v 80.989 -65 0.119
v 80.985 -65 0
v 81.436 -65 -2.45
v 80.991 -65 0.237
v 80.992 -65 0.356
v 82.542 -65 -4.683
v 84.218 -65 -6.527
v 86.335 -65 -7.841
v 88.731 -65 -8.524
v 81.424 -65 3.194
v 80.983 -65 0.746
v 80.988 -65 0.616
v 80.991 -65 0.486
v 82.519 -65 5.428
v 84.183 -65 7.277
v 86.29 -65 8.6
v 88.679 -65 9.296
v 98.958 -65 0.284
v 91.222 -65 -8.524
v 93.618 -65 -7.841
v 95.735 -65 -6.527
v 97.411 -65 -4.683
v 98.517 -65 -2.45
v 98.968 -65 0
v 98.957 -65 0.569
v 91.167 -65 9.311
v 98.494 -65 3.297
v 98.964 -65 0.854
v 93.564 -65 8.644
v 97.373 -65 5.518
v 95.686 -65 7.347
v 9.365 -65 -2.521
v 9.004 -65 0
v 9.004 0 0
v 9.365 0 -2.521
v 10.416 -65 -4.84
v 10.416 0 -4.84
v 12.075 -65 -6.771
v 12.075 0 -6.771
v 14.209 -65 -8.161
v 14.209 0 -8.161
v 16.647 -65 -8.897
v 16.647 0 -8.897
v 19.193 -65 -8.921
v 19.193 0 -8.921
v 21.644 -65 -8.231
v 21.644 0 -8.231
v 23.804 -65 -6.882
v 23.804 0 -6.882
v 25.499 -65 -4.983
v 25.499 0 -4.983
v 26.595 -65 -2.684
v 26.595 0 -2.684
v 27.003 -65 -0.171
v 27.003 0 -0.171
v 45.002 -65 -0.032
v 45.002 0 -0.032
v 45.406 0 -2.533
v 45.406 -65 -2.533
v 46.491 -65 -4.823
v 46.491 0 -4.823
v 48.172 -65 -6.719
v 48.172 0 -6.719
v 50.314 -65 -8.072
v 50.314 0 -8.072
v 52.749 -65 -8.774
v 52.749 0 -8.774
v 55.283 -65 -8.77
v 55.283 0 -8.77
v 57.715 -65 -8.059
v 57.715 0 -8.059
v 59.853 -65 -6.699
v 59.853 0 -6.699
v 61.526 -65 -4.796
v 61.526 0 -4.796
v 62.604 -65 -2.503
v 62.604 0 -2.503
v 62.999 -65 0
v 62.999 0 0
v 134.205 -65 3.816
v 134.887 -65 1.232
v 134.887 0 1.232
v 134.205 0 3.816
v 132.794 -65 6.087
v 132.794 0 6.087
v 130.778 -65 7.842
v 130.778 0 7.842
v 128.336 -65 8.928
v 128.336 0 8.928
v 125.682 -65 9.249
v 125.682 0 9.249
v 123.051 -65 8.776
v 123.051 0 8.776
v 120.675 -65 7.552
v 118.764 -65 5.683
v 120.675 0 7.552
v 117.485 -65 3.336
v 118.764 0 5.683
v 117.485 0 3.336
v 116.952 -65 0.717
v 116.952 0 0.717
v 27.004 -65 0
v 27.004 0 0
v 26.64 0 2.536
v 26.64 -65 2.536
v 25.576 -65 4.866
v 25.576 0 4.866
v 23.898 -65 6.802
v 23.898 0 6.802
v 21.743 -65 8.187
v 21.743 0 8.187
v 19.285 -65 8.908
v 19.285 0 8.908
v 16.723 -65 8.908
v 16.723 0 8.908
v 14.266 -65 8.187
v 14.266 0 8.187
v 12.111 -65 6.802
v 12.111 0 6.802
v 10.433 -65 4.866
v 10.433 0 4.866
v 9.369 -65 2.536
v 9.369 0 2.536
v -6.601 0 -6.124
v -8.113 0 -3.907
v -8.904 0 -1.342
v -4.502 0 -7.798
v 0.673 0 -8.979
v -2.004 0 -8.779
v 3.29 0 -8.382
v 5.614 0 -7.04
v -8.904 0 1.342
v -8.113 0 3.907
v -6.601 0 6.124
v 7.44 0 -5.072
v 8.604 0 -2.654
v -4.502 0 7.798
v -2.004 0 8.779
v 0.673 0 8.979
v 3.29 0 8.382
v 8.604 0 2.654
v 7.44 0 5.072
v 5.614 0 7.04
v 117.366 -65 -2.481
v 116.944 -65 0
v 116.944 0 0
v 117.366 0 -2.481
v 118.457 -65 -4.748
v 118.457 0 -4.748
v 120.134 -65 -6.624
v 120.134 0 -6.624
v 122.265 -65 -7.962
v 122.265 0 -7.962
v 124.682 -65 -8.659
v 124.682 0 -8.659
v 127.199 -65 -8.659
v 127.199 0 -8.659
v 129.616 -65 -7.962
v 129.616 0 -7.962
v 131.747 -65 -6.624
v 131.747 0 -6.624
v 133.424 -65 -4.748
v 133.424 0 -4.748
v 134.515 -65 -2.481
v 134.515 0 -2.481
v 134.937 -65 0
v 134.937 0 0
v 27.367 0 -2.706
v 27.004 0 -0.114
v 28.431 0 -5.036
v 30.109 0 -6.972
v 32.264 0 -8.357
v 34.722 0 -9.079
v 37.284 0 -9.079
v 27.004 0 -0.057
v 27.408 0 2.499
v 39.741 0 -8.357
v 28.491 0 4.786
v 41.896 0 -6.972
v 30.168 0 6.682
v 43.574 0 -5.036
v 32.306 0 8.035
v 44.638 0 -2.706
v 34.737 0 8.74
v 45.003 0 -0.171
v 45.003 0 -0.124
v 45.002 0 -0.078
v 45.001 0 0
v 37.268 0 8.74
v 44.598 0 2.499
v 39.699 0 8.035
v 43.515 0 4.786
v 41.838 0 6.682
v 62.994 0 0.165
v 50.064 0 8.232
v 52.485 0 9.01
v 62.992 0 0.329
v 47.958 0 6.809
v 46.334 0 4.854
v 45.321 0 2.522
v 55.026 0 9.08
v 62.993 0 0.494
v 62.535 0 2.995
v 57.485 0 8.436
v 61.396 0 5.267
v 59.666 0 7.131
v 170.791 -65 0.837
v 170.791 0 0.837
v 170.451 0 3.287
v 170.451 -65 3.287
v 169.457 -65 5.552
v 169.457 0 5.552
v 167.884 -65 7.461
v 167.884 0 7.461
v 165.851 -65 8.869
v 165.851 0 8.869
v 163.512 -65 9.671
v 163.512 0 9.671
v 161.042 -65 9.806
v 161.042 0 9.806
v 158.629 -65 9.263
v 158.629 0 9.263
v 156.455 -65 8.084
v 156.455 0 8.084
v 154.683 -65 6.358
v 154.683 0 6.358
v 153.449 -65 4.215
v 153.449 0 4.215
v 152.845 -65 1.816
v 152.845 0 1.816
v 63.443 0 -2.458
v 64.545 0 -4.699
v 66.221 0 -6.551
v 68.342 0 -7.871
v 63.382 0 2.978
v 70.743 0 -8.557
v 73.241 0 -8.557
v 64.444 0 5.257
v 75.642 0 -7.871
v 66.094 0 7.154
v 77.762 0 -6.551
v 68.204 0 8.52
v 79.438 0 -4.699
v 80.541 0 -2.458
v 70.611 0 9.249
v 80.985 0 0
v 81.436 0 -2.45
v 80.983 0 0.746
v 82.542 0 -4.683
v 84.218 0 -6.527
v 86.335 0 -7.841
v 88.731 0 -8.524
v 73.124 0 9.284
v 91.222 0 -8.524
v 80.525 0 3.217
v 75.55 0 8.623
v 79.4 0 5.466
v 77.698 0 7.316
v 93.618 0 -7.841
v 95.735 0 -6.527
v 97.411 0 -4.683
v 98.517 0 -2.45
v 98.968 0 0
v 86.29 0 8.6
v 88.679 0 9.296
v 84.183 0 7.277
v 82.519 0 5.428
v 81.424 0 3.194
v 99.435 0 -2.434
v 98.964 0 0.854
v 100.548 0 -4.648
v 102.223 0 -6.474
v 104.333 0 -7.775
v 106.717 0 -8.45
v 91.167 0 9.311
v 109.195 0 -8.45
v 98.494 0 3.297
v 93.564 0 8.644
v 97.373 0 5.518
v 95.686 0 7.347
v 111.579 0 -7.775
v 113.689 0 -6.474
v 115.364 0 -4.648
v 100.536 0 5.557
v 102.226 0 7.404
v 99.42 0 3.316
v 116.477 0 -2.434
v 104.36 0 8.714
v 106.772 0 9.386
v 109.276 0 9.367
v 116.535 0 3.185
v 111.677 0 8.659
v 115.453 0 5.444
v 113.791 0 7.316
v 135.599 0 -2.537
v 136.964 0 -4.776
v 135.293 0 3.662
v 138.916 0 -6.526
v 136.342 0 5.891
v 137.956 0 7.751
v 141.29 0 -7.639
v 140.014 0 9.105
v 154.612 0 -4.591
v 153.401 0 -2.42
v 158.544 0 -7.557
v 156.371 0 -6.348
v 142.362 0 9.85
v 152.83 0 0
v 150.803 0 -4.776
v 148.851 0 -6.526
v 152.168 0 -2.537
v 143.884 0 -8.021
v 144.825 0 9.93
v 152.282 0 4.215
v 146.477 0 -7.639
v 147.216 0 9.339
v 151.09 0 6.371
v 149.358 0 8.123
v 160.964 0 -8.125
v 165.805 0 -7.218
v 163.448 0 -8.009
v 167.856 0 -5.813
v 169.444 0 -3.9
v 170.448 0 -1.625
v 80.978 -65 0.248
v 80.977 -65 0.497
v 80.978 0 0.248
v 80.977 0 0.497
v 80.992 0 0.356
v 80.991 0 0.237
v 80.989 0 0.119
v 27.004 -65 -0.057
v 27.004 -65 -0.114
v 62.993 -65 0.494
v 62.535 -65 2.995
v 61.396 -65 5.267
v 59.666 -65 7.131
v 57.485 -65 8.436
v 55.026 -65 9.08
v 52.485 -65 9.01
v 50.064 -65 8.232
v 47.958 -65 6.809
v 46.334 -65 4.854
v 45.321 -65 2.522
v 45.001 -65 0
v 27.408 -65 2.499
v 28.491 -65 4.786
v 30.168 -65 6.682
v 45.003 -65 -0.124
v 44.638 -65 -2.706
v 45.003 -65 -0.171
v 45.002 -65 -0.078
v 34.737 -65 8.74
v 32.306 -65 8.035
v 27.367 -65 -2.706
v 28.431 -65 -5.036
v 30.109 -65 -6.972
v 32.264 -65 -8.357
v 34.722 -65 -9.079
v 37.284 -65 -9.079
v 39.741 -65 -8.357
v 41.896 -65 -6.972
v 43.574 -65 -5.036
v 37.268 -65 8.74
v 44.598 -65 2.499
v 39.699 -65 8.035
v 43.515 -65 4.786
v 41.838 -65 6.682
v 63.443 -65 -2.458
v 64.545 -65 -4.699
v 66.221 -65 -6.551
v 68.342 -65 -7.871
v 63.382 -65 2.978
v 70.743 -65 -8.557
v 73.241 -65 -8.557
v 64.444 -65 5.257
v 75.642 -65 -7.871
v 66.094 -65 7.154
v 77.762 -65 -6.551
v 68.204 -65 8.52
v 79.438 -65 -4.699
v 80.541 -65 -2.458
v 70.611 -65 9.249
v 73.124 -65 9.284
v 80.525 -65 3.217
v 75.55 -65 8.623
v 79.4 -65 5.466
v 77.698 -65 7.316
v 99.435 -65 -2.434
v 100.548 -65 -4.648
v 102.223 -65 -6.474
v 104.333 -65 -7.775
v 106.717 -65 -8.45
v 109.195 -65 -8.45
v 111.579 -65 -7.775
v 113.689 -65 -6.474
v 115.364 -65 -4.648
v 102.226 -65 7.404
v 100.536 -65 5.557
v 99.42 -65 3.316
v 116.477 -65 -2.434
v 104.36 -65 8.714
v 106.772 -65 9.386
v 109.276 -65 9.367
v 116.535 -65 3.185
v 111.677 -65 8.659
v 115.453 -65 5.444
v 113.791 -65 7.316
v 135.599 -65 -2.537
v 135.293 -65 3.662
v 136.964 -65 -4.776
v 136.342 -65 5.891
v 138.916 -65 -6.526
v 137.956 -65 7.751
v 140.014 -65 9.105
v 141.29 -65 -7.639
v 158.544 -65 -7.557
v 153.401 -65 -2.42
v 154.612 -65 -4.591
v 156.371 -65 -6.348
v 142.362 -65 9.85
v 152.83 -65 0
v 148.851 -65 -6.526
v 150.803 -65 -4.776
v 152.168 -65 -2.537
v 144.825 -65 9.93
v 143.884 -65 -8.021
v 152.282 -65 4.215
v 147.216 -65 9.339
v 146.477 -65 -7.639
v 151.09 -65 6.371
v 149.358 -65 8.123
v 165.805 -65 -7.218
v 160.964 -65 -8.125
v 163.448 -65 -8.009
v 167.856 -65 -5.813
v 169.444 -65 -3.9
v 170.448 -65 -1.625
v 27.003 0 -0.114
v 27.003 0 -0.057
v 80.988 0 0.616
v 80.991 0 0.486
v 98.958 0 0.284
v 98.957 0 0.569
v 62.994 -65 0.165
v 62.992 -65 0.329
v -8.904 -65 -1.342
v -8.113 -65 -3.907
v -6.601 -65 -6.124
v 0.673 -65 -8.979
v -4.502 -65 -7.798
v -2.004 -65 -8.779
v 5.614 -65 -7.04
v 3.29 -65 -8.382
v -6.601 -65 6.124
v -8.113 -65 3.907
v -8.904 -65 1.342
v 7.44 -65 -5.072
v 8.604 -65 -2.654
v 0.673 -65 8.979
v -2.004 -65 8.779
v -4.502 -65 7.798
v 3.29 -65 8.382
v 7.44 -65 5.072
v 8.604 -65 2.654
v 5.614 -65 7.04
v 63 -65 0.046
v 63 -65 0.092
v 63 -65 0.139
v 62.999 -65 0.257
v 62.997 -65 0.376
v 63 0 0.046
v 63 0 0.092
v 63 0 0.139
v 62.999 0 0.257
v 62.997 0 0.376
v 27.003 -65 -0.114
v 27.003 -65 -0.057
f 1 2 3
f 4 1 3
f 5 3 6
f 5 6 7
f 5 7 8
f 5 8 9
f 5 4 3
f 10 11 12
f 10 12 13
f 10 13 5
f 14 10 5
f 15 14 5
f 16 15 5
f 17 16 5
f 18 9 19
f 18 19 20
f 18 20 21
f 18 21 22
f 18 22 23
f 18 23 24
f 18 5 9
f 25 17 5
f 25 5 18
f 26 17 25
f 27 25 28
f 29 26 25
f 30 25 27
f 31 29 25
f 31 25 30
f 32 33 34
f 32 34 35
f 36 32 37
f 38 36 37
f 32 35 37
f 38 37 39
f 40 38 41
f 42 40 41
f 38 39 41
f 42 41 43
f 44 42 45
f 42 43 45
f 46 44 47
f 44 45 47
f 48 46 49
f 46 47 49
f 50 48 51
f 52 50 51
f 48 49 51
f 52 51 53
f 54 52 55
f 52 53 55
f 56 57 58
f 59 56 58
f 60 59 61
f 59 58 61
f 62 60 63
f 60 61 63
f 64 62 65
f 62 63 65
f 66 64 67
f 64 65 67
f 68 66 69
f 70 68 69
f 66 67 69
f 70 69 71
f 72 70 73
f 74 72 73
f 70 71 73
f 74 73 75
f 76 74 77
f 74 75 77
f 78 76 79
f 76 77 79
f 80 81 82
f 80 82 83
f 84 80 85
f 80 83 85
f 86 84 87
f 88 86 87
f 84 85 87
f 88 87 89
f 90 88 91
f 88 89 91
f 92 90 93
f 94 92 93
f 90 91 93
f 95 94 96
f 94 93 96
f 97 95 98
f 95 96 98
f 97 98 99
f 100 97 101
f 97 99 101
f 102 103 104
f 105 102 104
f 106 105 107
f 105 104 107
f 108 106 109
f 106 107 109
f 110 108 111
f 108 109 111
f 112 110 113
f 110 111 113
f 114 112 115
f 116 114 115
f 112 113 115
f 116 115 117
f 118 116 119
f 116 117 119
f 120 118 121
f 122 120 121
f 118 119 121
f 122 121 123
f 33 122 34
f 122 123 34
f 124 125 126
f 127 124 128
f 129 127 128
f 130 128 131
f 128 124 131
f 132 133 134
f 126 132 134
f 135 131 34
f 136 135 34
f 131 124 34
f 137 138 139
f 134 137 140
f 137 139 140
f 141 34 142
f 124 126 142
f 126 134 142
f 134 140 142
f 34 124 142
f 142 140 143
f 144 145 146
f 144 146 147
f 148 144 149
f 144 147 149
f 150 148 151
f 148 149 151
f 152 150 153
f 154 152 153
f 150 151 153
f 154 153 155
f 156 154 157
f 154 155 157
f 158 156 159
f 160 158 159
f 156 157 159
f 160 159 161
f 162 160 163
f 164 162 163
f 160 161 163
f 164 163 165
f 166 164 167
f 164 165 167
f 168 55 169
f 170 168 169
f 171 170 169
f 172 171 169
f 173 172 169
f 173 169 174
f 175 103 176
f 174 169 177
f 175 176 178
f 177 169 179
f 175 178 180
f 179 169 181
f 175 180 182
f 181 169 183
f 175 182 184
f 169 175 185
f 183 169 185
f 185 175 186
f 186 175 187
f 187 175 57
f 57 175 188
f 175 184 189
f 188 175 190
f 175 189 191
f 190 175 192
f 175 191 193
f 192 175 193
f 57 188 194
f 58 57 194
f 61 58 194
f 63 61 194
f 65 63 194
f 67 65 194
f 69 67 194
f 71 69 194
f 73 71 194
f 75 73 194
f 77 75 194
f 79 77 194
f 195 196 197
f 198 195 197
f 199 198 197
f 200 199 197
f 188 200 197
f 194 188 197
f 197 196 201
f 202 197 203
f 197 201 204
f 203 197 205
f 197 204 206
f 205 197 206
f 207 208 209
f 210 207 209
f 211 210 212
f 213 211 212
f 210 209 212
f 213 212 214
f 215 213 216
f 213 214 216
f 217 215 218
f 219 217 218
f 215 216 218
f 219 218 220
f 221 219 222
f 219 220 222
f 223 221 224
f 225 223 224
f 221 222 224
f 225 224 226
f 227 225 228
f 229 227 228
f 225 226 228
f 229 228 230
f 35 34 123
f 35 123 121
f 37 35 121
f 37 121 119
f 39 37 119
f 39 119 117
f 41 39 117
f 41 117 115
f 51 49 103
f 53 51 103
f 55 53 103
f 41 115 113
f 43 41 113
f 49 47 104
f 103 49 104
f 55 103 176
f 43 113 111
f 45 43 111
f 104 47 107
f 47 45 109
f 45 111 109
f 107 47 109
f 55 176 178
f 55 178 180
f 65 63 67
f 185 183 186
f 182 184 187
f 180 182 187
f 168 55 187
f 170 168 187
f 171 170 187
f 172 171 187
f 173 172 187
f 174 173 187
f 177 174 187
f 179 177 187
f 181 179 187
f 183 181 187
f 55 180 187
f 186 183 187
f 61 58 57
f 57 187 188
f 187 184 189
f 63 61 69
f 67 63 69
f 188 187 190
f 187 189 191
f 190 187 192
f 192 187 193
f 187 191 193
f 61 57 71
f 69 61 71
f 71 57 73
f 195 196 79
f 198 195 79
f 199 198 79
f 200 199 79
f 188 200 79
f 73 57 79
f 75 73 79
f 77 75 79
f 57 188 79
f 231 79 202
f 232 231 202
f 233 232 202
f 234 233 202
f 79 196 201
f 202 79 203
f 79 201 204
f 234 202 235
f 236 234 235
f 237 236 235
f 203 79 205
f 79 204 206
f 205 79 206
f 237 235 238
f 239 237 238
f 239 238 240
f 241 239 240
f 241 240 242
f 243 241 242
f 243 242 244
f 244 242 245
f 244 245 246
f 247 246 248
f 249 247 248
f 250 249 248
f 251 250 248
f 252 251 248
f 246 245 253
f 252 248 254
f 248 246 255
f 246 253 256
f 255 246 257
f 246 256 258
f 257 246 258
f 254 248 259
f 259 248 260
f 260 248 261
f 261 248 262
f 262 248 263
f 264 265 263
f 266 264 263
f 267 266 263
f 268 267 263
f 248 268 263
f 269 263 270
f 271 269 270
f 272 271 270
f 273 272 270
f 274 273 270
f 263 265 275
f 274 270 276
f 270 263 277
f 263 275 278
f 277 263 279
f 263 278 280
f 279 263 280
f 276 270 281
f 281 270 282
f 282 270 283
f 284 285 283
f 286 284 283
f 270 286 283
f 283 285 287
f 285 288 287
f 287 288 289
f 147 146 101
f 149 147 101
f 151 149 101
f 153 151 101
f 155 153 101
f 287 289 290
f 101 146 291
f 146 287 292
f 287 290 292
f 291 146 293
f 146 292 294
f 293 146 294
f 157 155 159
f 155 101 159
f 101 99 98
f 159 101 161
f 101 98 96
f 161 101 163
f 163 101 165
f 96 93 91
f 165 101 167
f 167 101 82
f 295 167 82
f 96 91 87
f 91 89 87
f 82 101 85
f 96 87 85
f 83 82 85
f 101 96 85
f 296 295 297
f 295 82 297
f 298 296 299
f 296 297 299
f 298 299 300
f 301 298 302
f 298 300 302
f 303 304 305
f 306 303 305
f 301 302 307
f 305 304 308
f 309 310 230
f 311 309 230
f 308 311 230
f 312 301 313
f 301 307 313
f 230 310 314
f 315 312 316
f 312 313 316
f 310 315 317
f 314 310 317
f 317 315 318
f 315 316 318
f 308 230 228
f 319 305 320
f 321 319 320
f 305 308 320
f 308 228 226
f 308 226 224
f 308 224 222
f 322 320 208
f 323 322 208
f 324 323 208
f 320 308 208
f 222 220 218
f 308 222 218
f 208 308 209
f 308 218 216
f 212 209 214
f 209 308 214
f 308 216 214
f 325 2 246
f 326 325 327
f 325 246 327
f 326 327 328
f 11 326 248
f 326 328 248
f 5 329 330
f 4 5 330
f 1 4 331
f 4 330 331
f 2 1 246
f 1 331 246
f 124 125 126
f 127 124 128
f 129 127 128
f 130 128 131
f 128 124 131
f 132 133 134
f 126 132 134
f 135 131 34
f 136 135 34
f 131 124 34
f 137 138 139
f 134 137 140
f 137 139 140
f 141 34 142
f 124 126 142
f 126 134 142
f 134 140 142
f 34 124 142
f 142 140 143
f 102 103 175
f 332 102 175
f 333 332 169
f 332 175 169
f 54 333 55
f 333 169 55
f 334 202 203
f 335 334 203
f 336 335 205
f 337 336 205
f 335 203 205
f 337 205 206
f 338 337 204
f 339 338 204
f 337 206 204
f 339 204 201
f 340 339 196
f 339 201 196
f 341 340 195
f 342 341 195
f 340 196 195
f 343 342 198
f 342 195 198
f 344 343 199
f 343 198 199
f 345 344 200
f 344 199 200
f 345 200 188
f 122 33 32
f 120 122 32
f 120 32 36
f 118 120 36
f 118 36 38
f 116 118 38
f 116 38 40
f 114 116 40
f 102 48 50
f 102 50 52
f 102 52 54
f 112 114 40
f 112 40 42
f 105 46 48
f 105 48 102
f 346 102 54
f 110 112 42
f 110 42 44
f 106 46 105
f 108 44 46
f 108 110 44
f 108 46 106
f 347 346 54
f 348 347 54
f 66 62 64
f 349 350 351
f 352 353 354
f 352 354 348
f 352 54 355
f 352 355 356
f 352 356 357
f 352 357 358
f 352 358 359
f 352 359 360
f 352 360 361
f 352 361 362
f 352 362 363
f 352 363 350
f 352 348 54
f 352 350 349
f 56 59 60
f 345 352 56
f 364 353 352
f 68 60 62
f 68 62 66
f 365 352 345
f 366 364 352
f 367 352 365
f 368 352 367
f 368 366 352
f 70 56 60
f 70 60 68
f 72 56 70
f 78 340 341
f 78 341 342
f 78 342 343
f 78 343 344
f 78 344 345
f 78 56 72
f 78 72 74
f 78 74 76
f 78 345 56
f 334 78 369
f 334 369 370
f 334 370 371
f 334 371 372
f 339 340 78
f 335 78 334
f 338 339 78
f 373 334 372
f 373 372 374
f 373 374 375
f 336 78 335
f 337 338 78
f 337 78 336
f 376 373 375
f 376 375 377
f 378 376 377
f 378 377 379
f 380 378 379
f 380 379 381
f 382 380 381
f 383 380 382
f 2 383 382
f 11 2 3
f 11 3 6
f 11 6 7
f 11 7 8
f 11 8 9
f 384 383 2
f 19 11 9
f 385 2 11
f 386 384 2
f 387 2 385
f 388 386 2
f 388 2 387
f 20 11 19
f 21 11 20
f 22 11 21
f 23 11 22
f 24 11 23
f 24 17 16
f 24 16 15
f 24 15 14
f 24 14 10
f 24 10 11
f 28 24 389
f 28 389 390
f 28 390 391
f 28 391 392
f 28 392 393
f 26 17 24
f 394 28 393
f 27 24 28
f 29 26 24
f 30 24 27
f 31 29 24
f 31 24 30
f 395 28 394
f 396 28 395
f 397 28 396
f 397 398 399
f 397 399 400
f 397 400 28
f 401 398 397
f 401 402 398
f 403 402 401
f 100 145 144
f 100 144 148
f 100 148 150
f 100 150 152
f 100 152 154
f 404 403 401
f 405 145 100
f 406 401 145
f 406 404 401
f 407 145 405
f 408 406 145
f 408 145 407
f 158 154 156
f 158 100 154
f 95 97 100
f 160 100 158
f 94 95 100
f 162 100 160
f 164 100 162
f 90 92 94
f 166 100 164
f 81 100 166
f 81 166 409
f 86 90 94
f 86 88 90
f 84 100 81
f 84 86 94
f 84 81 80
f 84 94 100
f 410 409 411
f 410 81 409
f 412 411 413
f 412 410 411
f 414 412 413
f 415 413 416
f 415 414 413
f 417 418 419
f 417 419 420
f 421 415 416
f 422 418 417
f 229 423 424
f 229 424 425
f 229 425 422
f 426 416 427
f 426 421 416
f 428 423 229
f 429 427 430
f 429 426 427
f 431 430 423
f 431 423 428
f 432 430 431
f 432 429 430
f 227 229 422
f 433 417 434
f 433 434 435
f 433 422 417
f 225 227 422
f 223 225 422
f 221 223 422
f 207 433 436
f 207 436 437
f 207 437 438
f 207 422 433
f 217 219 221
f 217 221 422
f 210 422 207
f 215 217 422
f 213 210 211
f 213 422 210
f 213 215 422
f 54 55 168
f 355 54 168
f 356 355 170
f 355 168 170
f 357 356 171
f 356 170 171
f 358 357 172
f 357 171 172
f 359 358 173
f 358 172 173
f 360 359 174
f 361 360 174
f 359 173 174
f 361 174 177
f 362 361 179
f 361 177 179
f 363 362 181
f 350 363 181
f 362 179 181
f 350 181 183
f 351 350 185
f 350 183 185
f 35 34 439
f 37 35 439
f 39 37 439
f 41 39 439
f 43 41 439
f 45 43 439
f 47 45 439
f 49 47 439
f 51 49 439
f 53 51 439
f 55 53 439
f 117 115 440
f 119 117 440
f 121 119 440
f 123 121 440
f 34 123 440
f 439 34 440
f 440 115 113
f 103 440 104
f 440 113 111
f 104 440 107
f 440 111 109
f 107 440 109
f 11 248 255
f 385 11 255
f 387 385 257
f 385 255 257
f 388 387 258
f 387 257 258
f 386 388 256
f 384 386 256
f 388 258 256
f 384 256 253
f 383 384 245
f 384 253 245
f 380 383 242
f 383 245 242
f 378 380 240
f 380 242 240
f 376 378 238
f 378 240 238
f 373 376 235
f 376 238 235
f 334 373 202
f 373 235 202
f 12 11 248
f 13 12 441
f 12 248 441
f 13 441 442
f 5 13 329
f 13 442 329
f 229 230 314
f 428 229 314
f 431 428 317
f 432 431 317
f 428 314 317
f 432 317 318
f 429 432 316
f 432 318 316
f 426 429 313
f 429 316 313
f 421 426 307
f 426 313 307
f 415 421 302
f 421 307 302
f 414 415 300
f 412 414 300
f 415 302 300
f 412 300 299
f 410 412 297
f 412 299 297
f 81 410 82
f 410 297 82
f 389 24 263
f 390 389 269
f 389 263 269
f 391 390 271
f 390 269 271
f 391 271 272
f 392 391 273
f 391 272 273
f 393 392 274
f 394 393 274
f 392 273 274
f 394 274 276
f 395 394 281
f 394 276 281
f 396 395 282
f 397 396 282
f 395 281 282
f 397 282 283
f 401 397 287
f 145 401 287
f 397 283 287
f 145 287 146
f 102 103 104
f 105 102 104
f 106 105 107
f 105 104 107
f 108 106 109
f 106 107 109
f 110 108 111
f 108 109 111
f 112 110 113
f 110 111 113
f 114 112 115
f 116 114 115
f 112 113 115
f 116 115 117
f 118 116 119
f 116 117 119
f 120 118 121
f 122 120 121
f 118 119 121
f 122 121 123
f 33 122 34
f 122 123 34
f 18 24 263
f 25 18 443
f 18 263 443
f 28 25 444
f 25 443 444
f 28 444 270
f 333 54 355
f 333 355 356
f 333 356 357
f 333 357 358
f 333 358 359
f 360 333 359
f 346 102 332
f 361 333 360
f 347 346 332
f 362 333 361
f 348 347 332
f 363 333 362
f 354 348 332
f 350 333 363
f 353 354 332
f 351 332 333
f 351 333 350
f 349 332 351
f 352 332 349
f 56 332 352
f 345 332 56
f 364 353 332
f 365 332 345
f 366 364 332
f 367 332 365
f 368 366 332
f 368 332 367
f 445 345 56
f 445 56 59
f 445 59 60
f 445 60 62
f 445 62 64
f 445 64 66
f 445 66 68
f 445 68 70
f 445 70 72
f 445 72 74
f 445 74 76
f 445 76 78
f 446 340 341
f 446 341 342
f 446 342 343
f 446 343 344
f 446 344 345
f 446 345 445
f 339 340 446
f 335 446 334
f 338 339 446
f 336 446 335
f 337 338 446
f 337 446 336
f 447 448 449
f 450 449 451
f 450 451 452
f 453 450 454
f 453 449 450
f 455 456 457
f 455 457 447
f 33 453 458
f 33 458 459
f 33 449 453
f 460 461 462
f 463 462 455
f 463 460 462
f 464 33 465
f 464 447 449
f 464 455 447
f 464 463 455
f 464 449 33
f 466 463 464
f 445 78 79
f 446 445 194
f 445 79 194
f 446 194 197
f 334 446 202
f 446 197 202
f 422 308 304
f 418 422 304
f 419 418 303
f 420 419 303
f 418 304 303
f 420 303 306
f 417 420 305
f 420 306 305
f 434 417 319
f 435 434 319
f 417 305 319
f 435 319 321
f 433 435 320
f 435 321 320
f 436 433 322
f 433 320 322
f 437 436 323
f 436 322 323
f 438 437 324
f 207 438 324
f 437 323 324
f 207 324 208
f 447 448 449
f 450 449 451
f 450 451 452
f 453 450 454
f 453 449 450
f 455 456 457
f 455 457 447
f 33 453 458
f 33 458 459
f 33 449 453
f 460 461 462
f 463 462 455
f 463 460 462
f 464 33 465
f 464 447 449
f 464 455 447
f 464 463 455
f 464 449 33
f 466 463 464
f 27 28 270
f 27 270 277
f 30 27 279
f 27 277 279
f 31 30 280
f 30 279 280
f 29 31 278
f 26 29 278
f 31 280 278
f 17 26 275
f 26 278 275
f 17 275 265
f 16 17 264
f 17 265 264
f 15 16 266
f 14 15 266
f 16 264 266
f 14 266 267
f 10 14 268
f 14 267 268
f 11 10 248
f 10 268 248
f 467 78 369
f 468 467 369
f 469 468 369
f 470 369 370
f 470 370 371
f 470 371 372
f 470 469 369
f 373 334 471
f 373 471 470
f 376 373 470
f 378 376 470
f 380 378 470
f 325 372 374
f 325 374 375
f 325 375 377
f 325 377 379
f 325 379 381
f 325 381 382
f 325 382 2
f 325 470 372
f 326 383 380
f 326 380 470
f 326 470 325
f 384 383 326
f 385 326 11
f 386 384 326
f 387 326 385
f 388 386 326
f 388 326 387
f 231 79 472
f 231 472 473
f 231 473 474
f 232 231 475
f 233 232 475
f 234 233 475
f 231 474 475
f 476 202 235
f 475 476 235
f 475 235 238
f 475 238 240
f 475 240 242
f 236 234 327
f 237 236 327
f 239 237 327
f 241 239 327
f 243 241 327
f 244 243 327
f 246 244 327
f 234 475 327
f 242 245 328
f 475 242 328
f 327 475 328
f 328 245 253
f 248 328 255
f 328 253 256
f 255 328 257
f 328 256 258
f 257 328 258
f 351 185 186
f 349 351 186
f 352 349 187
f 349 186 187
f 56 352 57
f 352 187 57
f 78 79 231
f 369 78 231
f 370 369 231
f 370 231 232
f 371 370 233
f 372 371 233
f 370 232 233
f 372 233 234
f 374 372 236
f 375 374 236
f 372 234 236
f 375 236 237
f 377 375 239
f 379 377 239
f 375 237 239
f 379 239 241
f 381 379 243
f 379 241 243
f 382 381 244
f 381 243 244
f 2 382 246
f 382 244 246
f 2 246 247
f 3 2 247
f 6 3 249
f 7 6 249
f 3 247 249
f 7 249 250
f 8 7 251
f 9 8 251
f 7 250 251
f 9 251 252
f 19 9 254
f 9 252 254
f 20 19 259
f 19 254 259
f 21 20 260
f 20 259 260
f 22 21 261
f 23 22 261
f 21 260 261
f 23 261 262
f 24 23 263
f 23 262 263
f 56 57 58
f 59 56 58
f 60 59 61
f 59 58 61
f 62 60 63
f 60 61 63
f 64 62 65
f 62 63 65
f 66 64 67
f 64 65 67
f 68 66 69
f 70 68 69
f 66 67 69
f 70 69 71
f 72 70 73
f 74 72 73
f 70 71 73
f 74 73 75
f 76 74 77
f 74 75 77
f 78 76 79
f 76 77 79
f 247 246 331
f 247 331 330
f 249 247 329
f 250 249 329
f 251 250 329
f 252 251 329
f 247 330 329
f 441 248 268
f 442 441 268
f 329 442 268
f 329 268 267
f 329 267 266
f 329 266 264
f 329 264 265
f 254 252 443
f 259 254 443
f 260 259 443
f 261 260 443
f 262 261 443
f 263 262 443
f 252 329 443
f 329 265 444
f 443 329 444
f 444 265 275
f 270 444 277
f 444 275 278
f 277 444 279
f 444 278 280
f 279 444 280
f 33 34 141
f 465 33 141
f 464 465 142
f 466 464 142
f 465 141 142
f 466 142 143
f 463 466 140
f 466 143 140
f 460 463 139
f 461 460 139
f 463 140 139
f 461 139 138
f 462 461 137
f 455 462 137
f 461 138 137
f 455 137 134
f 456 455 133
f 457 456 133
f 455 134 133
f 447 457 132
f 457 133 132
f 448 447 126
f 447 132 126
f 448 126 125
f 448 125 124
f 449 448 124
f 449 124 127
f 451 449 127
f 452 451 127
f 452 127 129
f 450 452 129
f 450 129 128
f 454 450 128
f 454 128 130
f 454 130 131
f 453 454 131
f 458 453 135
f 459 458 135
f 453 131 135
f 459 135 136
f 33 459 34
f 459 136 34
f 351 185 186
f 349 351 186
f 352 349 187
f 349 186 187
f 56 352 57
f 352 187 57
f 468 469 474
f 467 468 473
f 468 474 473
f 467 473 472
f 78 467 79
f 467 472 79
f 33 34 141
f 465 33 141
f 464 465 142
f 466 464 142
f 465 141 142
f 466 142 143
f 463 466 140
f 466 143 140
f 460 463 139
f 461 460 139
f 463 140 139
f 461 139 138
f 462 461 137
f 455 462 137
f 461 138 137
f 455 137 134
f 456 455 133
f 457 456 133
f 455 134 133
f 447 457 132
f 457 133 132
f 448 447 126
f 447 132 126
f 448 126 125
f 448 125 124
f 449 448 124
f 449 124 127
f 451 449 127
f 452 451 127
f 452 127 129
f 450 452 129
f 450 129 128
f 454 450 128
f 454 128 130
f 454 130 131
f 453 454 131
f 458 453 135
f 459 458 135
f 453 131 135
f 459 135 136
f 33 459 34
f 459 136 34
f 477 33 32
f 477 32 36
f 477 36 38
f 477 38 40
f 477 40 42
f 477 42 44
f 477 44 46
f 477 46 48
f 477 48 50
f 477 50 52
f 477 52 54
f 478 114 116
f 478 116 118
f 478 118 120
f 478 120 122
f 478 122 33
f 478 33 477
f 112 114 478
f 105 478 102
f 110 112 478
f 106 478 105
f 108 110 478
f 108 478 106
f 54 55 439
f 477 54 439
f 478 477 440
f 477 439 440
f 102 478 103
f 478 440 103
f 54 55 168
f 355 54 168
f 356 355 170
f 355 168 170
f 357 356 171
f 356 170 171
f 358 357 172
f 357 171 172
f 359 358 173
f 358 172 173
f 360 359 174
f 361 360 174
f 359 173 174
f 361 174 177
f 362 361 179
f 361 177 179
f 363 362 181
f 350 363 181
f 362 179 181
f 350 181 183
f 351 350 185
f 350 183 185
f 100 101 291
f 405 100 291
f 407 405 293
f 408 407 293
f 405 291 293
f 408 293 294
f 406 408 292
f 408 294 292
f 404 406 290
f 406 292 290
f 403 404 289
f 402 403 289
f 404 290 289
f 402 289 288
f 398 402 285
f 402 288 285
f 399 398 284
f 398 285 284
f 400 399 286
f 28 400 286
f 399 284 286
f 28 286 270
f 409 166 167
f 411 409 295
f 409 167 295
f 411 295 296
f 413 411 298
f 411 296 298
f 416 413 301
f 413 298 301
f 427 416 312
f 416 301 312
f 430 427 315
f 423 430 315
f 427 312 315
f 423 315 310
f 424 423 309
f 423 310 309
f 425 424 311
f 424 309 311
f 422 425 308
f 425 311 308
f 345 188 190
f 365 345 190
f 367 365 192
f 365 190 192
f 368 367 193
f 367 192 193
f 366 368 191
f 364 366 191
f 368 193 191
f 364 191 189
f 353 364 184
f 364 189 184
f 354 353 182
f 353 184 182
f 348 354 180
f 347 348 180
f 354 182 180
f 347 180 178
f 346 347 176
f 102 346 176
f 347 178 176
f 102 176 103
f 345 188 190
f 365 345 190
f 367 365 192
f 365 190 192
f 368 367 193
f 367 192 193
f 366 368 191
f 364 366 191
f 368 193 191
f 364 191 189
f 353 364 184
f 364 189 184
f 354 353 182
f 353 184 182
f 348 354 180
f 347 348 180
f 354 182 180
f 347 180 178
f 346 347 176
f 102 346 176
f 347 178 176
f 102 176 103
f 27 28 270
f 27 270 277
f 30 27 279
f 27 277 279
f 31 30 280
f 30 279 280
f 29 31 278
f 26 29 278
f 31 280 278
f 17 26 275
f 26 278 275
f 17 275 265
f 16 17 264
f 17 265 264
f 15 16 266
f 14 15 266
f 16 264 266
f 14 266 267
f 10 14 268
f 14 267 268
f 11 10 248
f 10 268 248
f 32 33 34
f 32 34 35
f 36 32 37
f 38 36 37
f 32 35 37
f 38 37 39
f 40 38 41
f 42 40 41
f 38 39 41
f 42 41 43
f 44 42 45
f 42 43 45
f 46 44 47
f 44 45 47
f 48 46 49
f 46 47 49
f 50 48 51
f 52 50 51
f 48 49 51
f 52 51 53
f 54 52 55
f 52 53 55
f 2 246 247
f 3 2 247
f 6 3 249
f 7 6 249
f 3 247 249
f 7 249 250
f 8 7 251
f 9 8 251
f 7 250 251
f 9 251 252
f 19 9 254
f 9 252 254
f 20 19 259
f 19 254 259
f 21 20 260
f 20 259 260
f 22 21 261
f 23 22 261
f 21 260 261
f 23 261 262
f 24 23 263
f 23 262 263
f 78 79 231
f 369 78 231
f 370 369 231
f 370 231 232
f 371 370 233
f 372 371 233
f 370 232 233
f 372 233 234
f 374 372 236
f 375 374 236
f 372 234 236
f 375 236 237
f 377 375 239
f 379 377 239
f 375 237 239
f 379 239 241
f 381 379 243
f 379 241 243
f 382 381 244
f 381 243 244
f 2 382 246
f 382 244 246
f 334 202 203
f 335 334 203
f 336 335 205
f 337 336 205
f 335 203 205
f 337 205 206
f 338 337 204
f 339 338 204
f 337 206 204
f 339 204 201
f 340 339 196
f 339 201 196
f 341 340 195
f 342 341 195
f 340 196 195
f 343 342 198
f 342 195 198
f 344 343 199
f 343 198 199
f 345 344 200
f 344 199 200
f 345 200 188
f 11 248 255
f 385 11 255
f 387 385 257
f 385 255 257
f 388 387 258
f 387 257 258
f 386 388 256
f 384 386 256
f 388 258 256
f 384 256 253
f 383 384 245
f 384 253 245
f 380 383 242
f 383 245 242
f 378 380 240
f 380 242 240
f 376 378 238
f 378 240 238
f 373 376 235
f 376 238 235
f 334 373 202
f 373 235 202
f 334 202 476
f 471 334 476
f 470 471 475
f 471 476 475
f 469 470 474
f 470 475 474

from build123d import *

# Parameters (mm, degrees)
F0_R     = 9.0043
F1_DEPTH = 65
F2_DEPTH = 65


with BuildPart() as f1:
    # F0 (on Front) → F1 (new body)
    with BuildSketch(Plane.XZ):
        Circle(F0_R)
    extrude(amount=F1_DEPTH)


with BuildPart() as f1b:
    # F0 (on Front) → F1, piece 2 (new body)
    with BuildSketch(Plane.XZ):
        with BuildLine():
            ThreePointArc((27.0043, 0), (18.0043, 9), (9.0043, 0))
            ThreePointArc((9.0043, 0), (17.9190098256, -8.9995958568), (27.0026834636, -0.1705726889))
            ThreePointArc((27.0026834636, -0.1705726889), (27.0030876068, -0.0852825145), (27.0043, 0))
        make_face()
    extrude(amount=F1_DEPTH)


with BuildPart() as f1c:
    # F0 (on Front) → F1, piece 3 (new body)
    with BuildSketch(Plane.XZ):
        with BuildLine():
            ThreePointArc((45.0013565478, -0.0160323255), (36.0107009342, 8.82942374), (27.0043, 0))
            ThreePointArc((27.0043, 0), (27.0038958568, -0.0852901744), (27.0026834636, -0.1705726889))
            ThreePointArc((27.0026834636, -0.1705726889), (36.0026834636, -9.1705726889), (45.0026834636, -0.1705726889))
            ThreePointArc((45.0026834636, -0.1705726889), (45.0023517285, -0.0932996589), (45.0013565478, -0.0160323255))
        make_face()
        with BuildLine():
            ThreePointArc((62.9929668109, 0.4942702989), (53.7448335524, 9.1348895724), (45.0013279832, -0.016032816))
            ThreePointArc((45.0013279832, -0.016032816), (54.008018538, -8.8614888815), (62.9989352075, 0))
            ThreePointArc((62.9989352075, 0), (62.9925570229, 0.2470941665), (62.9929668109, 0.4942702989))
        make_face()
    extrude(amount=F1_DEPTH)


with BuildPart() as f1d:
    # F0 (on Front) → F1, piece 4 (new body)
    with BuildSketch(Plane.XZ):
        with BuildLine():
            ThreePointArc((80.9834577198, 0.745515077), (71.8662244177, 9.3548852314), (62.9929668109, 0.4942702989))
            ThreePointArc((62.9929668109, 0.4942702989), (62.9982423314, 0.3164236907), (63.0000010674, 0.1385075474))
            ThreePointArc((63.0000010674, 0.1385075474), (62.9997345985, 0.0692517232), (62.9989352075, 0))
            ThreePointArc((62.9989352075, 0), (71.9919009511, -8.6442372485), (80.9848666946, 0))
            ThreePointArc((80.9848666946, 0), (80.9764395366, 0.3727429432), (80.9834577198, 0.745515077))
        make_face()
    extrude(amount=F1_DEPTH)


with BuildPart() as f1e:
    # F0 (on Front) → F1, piece 5 (new body)
    with BuildSketch(Plane.XZ):
        with BuildLine():
            ThreePointArc((98.9644590085, 0.8536672309), (89.9222912288, 9.3895895297), (80.9834577198, 0.745515077))
            ThreePointArc((80.9834577198, 0.745515077), (80.9897898957, 0.5506846354), (80.9919009511, 0.3557627515))
            ThreePointArc((80.9919009511, 0.3557627515), (80.9901422151, 0.1778466082), (80.9848666946, 0))
            ThreePointArc((80.9848666946, 0), (89.9764234633, -8.6102476745), (98.967980232, 0))
            ThreePointArc((98.967980232, 0), (98.9560923398, 0.4267918422), (98.9644590085, 0.8536672309))
        make_face()
    extrude(amount=F1_DEPTH)


with BuildPart() as f2:
    # F0 (on Front) → F2 (new body)
    with BuildSketch(Plane.XZ):
        Circle(F0_R)
    extrude(amount=F2_DEPTH)


with BuildPart() as f2b:
    # F0 (on Front) → F2, piece 2 (new body)
    with BuildSketch(Plane.XZ):
        with BuildLine():
            ThreePointArc((62.9929668109, 0.4942702989), (53.7448335524, 9.1348895724), (45.0013279832, -0.016032816))
            ThreePointArc((45.0013279832, -0.016032816), (54.008018538, -8.8614888815), (62.9989352075, 0))
            ThreePointArc((62.9989352075, 0), (62.9925570229, 0.2470941665), (62.9929668109, 0.4942702989))
        make_face()
        with BuildLine():
            ThreePointArc((27.0043, 0), (18.0043, 9), (9.0043, 0))
            ThreePointArc((9.0043, 0), (17.9190098256, -8.9995958568), (27.0026834636, -0.1705726889))
            ThreePointArc((27.0026834636, -0.1705726889), (27.0030876068, -0.0852825145), (27.0043, 0))
        make_face()
        with BuildLine():
            ThreePointArc((45.0013565478, -0.0160323255), (36.0107009342, 8.82942374), (27.0043, 0))
            ThreePointArc((27.0043, 0), (27.0038958568, -0.0852901744), (27.0026834636, -0.1705726889))
            ThreePointArc((27.0026834636, -0.1705726889), (36.0026834636, -9.1705726889), (45.0026834636, -0.1705726889))
            ThreePointArc((45.0026834636, -0.1705726889), (45.0023517285, -0.0932996589), (45.0013565478, -0.0160323255))
        make_face()
        with BuildLine():
            ThreePointArc((27.0026834636, -0.1705726889), (27.0038958568, -0.0852901744), (27.0043, 0))
            ThreePointArc((27.0043, 0), (27.0030876068, -0.0852825145), (27.0026834636, -0.1705726889))
        make_face()
        with BuildLine():
            ThreePointArc((80.9834577198, 0.745515077), (71.8662244177, 9.3548852314), (62.9929668109, 0.4942702989))
            ThreePointArc((62.9929668109, 0.4942702989), (62.9982423314, 0.3164236907), (63.0000010674, 0.1385075474))
            ThreePointArc((63.0000010674, 0.1385075474), (62.9997345985, 0.0692517232), (62.9989352075, 0))
            ThreePointArc((62.9989352075, 0), (71.9919009511, -8.6442372485), (80.9848666946, 0))
            ThreePointArc((80.9848666946, 0), (80.9764395366, 0.3727429432), (80.9834577198, 0.745515077))
        make_face()
        with BuildLine():
            ThreePointArc((63.0000010674, 0.1385075474), (62.9982423314, 0.3164236907), (62.9929668109, 0.4942702989))
            ThreePointArc((62.9929668109, 0.4942702989), (62.9925570229, 0.2470941665), (62.9989352075, 0))
            ThreePointArc((62.9989352075, 0), (62.9997345985, 0.0692517232), (63.0000010674, 0.1385075474))
        make_face()
        with BuildLine():
            ThreePointArc((98.9644590085, 0.8536672309), (89.9222912288, 9.3895895297), (80.9834577198, 0.745515077))
            ThreePointArc((80.9834577198, 0.745515077), (80.9897898957, 0.5506846354), (80.9919009511, 0.3557627515))
            ThreePointArc((80.9919009511, 0.3557627515), (80.9901422151, 0.1778466082), (80.9848666946, 0))
            ThreePointArc((80.9848666946, 0), (89.9764234633, -8.6102476745), (98.967980232, 0))
            ThreePointArc((98.967980232, 0), (98.9560923398, 0.4267918422), (98.9644590085, 0.8536672309))
        make_face()
        with BuildLine():
            ThreePointArc((80.9919009511, 0.3557627515), (80.9897898957, 0.5506846354), (80.9834577198, 0.745515077))
            ThreePointArc((80.9834577198, 0.745515077), (80.9764395366, 0.3727429432), (80.9848666946, 0))
            ThreePointArc((80.9848666946, 0), (80.9901422151, 0.1778466082), (80.9919009511, 0.3557627515))
        make_face()
        with BuildLine():
            ThreePointArc((116.9524651409, 0.716697116), (108.0245445118, 9.4636540023), (98.9644590085, 0.8536672309))
            ThreePointArc((98.9644590085, 0.8536672309), (98.9734318524, 0.6217869068), (98.9764234633, 0.3897523255))
            ThreePointArc((98.9764234633, 0.3897523255), (98.9743124079, 0.1948304416), (98.967980232, 0))
            ThreePointArc((98.967980232, 0), (107.9560157772, -8.5360850946), (116.9440513223, 0))
            ThreePointArc((116.9440513223, 0), (116.9411208158, 0.3584323492), (116.9524651409, 0.716697116))
        make_face()
        with BuildLine():
            ThreePointArc((98.9764234633, 0.3897523255), (98.9734318524, 0.6217869068), (98.9644590085, 0.8536672309))
            ThreePointArc((98.9644590085, 0.8536672309), (98.9560923398, 0.4267918422), (98.967980232, 0))
            ThreePointArc((98.967980232, 0), (98.9743124079, 0.1948304416), (98.9764234633, 0.3897523255))
        make_face()
        with BuildLine():
            ThreePointArc((134.8870833011, 1.2318938033), (125.6820698577, 9.2490710848), (116.9524651409, 0.716697116))
            ThreePointArc((116.9524651409, 0.716697116), (116.9551280743, 0.5903184783), (116.9560157772, 0.4639149054))
            ThreePointArc((116.9560157772, 0.4639149054), (116.9530241662, 0.2318803241), (116.9440513223, 0))
            ThreePointArc((116.9440513223, 0), (125.940500686, -8.7472177894), (134.9369500497, 0))
            ThreePointArc((134.9369500497, 0), (134.8908973596, 0.6150919971), (134.8870833011, 1.2318938033))
        make_face()
        with BuildLine():
            ThreePointArc((116.9560157772, 0.4639149054), (116.9551280743, 0.5903184783), (116.9524651409, 0.716697116))
            ThreePointArc((116.9524651409, 0.716697116), (116.9411208158, 0.3584323492), (116.9440513223, 0))
            ThreePointArc((116.9440513223, 0), (116.9530241662, 0.2318803241), (116.9560157772, 0.4639149054))
        make_face()
        with BuildLine():
            ThreePointArc((152.8445059025, 1.8163443168), (143.5907695532, 9.9743486524), (134.8870833011, 1.2318938033))
            ThreePointArc((134.8870833011, 1.2318938033), (134.9271364174, 0.7430660386), (134.940500686, 0.2527822106))
            ThreePointArc((134.940500686, 0.2527822106), (134.9396129832, 0.1263786377), (134.9369500497, 0))
            ThreePointArc((134.9369500497, 0), (143.8835326649, -8.0208884073), (152.83011528, 0))
            ThreePointArc((152.83011528, 0), (152.7913709763, 0.908536131), (152.8445059025, 1.8163443168))
        make_face()
        with BuildLine():
            ThreePointArc((134.940500686, 0.2527822106), (134.9271364174, 0.7430660386), (134.8870833011, 1.2318938033))
            ThreePointArc((134.8870833011, 1.2318938033), (134.8908973596, 0.6150919971), (134.9369500497, 0))
            ThreePointArc((134.9369500497, 0), (134.9396129832, 0.1263786377), (134.940500686, 0.2527822106))
        make_face()
        with BuildLine():
            ThreePointArc((170.7910885176, 0.8372327241), (162.2813723456, 9.8238684555), (152.8445059025, 1.8163443168))
            ThreePointArc((152.8445059025, 1.8163443168), (152.87377068, 1.3981825063), (152.8835326649, 0.9791115927))
            ThreePointArc((152.8835326649, 0.9791115927), (152.8701683962, 0.4888277647), (152.83011528, 0))
            ThreePointArc((152.83011528, 0), (162.2101594312, -8.1530052911), (170.7910885176, 0.8372327241))
        make_face()
        with BuildLine():
            ThreePointArc((152.8835326649, 0.9791115927), (152.87377068, 1.3981825063), (152.8445059025, 1.8163443168))
            ThreePointArc((152.8445059025, 1.8163443168), (152.7913709763, 0.908536131), (152.83011528, 0))
            ThreePointArc((152.83011528, 0), (152.8701683962, 0.4888277647), (152.8835326649, 0.9791115927))
        make_face()
    extrude(amount=F2_DEPTH)


solid = Compound([f1.part, f1b.part, f1c.part, f1d.part, f1e.part, f2.part, f2b.part])
